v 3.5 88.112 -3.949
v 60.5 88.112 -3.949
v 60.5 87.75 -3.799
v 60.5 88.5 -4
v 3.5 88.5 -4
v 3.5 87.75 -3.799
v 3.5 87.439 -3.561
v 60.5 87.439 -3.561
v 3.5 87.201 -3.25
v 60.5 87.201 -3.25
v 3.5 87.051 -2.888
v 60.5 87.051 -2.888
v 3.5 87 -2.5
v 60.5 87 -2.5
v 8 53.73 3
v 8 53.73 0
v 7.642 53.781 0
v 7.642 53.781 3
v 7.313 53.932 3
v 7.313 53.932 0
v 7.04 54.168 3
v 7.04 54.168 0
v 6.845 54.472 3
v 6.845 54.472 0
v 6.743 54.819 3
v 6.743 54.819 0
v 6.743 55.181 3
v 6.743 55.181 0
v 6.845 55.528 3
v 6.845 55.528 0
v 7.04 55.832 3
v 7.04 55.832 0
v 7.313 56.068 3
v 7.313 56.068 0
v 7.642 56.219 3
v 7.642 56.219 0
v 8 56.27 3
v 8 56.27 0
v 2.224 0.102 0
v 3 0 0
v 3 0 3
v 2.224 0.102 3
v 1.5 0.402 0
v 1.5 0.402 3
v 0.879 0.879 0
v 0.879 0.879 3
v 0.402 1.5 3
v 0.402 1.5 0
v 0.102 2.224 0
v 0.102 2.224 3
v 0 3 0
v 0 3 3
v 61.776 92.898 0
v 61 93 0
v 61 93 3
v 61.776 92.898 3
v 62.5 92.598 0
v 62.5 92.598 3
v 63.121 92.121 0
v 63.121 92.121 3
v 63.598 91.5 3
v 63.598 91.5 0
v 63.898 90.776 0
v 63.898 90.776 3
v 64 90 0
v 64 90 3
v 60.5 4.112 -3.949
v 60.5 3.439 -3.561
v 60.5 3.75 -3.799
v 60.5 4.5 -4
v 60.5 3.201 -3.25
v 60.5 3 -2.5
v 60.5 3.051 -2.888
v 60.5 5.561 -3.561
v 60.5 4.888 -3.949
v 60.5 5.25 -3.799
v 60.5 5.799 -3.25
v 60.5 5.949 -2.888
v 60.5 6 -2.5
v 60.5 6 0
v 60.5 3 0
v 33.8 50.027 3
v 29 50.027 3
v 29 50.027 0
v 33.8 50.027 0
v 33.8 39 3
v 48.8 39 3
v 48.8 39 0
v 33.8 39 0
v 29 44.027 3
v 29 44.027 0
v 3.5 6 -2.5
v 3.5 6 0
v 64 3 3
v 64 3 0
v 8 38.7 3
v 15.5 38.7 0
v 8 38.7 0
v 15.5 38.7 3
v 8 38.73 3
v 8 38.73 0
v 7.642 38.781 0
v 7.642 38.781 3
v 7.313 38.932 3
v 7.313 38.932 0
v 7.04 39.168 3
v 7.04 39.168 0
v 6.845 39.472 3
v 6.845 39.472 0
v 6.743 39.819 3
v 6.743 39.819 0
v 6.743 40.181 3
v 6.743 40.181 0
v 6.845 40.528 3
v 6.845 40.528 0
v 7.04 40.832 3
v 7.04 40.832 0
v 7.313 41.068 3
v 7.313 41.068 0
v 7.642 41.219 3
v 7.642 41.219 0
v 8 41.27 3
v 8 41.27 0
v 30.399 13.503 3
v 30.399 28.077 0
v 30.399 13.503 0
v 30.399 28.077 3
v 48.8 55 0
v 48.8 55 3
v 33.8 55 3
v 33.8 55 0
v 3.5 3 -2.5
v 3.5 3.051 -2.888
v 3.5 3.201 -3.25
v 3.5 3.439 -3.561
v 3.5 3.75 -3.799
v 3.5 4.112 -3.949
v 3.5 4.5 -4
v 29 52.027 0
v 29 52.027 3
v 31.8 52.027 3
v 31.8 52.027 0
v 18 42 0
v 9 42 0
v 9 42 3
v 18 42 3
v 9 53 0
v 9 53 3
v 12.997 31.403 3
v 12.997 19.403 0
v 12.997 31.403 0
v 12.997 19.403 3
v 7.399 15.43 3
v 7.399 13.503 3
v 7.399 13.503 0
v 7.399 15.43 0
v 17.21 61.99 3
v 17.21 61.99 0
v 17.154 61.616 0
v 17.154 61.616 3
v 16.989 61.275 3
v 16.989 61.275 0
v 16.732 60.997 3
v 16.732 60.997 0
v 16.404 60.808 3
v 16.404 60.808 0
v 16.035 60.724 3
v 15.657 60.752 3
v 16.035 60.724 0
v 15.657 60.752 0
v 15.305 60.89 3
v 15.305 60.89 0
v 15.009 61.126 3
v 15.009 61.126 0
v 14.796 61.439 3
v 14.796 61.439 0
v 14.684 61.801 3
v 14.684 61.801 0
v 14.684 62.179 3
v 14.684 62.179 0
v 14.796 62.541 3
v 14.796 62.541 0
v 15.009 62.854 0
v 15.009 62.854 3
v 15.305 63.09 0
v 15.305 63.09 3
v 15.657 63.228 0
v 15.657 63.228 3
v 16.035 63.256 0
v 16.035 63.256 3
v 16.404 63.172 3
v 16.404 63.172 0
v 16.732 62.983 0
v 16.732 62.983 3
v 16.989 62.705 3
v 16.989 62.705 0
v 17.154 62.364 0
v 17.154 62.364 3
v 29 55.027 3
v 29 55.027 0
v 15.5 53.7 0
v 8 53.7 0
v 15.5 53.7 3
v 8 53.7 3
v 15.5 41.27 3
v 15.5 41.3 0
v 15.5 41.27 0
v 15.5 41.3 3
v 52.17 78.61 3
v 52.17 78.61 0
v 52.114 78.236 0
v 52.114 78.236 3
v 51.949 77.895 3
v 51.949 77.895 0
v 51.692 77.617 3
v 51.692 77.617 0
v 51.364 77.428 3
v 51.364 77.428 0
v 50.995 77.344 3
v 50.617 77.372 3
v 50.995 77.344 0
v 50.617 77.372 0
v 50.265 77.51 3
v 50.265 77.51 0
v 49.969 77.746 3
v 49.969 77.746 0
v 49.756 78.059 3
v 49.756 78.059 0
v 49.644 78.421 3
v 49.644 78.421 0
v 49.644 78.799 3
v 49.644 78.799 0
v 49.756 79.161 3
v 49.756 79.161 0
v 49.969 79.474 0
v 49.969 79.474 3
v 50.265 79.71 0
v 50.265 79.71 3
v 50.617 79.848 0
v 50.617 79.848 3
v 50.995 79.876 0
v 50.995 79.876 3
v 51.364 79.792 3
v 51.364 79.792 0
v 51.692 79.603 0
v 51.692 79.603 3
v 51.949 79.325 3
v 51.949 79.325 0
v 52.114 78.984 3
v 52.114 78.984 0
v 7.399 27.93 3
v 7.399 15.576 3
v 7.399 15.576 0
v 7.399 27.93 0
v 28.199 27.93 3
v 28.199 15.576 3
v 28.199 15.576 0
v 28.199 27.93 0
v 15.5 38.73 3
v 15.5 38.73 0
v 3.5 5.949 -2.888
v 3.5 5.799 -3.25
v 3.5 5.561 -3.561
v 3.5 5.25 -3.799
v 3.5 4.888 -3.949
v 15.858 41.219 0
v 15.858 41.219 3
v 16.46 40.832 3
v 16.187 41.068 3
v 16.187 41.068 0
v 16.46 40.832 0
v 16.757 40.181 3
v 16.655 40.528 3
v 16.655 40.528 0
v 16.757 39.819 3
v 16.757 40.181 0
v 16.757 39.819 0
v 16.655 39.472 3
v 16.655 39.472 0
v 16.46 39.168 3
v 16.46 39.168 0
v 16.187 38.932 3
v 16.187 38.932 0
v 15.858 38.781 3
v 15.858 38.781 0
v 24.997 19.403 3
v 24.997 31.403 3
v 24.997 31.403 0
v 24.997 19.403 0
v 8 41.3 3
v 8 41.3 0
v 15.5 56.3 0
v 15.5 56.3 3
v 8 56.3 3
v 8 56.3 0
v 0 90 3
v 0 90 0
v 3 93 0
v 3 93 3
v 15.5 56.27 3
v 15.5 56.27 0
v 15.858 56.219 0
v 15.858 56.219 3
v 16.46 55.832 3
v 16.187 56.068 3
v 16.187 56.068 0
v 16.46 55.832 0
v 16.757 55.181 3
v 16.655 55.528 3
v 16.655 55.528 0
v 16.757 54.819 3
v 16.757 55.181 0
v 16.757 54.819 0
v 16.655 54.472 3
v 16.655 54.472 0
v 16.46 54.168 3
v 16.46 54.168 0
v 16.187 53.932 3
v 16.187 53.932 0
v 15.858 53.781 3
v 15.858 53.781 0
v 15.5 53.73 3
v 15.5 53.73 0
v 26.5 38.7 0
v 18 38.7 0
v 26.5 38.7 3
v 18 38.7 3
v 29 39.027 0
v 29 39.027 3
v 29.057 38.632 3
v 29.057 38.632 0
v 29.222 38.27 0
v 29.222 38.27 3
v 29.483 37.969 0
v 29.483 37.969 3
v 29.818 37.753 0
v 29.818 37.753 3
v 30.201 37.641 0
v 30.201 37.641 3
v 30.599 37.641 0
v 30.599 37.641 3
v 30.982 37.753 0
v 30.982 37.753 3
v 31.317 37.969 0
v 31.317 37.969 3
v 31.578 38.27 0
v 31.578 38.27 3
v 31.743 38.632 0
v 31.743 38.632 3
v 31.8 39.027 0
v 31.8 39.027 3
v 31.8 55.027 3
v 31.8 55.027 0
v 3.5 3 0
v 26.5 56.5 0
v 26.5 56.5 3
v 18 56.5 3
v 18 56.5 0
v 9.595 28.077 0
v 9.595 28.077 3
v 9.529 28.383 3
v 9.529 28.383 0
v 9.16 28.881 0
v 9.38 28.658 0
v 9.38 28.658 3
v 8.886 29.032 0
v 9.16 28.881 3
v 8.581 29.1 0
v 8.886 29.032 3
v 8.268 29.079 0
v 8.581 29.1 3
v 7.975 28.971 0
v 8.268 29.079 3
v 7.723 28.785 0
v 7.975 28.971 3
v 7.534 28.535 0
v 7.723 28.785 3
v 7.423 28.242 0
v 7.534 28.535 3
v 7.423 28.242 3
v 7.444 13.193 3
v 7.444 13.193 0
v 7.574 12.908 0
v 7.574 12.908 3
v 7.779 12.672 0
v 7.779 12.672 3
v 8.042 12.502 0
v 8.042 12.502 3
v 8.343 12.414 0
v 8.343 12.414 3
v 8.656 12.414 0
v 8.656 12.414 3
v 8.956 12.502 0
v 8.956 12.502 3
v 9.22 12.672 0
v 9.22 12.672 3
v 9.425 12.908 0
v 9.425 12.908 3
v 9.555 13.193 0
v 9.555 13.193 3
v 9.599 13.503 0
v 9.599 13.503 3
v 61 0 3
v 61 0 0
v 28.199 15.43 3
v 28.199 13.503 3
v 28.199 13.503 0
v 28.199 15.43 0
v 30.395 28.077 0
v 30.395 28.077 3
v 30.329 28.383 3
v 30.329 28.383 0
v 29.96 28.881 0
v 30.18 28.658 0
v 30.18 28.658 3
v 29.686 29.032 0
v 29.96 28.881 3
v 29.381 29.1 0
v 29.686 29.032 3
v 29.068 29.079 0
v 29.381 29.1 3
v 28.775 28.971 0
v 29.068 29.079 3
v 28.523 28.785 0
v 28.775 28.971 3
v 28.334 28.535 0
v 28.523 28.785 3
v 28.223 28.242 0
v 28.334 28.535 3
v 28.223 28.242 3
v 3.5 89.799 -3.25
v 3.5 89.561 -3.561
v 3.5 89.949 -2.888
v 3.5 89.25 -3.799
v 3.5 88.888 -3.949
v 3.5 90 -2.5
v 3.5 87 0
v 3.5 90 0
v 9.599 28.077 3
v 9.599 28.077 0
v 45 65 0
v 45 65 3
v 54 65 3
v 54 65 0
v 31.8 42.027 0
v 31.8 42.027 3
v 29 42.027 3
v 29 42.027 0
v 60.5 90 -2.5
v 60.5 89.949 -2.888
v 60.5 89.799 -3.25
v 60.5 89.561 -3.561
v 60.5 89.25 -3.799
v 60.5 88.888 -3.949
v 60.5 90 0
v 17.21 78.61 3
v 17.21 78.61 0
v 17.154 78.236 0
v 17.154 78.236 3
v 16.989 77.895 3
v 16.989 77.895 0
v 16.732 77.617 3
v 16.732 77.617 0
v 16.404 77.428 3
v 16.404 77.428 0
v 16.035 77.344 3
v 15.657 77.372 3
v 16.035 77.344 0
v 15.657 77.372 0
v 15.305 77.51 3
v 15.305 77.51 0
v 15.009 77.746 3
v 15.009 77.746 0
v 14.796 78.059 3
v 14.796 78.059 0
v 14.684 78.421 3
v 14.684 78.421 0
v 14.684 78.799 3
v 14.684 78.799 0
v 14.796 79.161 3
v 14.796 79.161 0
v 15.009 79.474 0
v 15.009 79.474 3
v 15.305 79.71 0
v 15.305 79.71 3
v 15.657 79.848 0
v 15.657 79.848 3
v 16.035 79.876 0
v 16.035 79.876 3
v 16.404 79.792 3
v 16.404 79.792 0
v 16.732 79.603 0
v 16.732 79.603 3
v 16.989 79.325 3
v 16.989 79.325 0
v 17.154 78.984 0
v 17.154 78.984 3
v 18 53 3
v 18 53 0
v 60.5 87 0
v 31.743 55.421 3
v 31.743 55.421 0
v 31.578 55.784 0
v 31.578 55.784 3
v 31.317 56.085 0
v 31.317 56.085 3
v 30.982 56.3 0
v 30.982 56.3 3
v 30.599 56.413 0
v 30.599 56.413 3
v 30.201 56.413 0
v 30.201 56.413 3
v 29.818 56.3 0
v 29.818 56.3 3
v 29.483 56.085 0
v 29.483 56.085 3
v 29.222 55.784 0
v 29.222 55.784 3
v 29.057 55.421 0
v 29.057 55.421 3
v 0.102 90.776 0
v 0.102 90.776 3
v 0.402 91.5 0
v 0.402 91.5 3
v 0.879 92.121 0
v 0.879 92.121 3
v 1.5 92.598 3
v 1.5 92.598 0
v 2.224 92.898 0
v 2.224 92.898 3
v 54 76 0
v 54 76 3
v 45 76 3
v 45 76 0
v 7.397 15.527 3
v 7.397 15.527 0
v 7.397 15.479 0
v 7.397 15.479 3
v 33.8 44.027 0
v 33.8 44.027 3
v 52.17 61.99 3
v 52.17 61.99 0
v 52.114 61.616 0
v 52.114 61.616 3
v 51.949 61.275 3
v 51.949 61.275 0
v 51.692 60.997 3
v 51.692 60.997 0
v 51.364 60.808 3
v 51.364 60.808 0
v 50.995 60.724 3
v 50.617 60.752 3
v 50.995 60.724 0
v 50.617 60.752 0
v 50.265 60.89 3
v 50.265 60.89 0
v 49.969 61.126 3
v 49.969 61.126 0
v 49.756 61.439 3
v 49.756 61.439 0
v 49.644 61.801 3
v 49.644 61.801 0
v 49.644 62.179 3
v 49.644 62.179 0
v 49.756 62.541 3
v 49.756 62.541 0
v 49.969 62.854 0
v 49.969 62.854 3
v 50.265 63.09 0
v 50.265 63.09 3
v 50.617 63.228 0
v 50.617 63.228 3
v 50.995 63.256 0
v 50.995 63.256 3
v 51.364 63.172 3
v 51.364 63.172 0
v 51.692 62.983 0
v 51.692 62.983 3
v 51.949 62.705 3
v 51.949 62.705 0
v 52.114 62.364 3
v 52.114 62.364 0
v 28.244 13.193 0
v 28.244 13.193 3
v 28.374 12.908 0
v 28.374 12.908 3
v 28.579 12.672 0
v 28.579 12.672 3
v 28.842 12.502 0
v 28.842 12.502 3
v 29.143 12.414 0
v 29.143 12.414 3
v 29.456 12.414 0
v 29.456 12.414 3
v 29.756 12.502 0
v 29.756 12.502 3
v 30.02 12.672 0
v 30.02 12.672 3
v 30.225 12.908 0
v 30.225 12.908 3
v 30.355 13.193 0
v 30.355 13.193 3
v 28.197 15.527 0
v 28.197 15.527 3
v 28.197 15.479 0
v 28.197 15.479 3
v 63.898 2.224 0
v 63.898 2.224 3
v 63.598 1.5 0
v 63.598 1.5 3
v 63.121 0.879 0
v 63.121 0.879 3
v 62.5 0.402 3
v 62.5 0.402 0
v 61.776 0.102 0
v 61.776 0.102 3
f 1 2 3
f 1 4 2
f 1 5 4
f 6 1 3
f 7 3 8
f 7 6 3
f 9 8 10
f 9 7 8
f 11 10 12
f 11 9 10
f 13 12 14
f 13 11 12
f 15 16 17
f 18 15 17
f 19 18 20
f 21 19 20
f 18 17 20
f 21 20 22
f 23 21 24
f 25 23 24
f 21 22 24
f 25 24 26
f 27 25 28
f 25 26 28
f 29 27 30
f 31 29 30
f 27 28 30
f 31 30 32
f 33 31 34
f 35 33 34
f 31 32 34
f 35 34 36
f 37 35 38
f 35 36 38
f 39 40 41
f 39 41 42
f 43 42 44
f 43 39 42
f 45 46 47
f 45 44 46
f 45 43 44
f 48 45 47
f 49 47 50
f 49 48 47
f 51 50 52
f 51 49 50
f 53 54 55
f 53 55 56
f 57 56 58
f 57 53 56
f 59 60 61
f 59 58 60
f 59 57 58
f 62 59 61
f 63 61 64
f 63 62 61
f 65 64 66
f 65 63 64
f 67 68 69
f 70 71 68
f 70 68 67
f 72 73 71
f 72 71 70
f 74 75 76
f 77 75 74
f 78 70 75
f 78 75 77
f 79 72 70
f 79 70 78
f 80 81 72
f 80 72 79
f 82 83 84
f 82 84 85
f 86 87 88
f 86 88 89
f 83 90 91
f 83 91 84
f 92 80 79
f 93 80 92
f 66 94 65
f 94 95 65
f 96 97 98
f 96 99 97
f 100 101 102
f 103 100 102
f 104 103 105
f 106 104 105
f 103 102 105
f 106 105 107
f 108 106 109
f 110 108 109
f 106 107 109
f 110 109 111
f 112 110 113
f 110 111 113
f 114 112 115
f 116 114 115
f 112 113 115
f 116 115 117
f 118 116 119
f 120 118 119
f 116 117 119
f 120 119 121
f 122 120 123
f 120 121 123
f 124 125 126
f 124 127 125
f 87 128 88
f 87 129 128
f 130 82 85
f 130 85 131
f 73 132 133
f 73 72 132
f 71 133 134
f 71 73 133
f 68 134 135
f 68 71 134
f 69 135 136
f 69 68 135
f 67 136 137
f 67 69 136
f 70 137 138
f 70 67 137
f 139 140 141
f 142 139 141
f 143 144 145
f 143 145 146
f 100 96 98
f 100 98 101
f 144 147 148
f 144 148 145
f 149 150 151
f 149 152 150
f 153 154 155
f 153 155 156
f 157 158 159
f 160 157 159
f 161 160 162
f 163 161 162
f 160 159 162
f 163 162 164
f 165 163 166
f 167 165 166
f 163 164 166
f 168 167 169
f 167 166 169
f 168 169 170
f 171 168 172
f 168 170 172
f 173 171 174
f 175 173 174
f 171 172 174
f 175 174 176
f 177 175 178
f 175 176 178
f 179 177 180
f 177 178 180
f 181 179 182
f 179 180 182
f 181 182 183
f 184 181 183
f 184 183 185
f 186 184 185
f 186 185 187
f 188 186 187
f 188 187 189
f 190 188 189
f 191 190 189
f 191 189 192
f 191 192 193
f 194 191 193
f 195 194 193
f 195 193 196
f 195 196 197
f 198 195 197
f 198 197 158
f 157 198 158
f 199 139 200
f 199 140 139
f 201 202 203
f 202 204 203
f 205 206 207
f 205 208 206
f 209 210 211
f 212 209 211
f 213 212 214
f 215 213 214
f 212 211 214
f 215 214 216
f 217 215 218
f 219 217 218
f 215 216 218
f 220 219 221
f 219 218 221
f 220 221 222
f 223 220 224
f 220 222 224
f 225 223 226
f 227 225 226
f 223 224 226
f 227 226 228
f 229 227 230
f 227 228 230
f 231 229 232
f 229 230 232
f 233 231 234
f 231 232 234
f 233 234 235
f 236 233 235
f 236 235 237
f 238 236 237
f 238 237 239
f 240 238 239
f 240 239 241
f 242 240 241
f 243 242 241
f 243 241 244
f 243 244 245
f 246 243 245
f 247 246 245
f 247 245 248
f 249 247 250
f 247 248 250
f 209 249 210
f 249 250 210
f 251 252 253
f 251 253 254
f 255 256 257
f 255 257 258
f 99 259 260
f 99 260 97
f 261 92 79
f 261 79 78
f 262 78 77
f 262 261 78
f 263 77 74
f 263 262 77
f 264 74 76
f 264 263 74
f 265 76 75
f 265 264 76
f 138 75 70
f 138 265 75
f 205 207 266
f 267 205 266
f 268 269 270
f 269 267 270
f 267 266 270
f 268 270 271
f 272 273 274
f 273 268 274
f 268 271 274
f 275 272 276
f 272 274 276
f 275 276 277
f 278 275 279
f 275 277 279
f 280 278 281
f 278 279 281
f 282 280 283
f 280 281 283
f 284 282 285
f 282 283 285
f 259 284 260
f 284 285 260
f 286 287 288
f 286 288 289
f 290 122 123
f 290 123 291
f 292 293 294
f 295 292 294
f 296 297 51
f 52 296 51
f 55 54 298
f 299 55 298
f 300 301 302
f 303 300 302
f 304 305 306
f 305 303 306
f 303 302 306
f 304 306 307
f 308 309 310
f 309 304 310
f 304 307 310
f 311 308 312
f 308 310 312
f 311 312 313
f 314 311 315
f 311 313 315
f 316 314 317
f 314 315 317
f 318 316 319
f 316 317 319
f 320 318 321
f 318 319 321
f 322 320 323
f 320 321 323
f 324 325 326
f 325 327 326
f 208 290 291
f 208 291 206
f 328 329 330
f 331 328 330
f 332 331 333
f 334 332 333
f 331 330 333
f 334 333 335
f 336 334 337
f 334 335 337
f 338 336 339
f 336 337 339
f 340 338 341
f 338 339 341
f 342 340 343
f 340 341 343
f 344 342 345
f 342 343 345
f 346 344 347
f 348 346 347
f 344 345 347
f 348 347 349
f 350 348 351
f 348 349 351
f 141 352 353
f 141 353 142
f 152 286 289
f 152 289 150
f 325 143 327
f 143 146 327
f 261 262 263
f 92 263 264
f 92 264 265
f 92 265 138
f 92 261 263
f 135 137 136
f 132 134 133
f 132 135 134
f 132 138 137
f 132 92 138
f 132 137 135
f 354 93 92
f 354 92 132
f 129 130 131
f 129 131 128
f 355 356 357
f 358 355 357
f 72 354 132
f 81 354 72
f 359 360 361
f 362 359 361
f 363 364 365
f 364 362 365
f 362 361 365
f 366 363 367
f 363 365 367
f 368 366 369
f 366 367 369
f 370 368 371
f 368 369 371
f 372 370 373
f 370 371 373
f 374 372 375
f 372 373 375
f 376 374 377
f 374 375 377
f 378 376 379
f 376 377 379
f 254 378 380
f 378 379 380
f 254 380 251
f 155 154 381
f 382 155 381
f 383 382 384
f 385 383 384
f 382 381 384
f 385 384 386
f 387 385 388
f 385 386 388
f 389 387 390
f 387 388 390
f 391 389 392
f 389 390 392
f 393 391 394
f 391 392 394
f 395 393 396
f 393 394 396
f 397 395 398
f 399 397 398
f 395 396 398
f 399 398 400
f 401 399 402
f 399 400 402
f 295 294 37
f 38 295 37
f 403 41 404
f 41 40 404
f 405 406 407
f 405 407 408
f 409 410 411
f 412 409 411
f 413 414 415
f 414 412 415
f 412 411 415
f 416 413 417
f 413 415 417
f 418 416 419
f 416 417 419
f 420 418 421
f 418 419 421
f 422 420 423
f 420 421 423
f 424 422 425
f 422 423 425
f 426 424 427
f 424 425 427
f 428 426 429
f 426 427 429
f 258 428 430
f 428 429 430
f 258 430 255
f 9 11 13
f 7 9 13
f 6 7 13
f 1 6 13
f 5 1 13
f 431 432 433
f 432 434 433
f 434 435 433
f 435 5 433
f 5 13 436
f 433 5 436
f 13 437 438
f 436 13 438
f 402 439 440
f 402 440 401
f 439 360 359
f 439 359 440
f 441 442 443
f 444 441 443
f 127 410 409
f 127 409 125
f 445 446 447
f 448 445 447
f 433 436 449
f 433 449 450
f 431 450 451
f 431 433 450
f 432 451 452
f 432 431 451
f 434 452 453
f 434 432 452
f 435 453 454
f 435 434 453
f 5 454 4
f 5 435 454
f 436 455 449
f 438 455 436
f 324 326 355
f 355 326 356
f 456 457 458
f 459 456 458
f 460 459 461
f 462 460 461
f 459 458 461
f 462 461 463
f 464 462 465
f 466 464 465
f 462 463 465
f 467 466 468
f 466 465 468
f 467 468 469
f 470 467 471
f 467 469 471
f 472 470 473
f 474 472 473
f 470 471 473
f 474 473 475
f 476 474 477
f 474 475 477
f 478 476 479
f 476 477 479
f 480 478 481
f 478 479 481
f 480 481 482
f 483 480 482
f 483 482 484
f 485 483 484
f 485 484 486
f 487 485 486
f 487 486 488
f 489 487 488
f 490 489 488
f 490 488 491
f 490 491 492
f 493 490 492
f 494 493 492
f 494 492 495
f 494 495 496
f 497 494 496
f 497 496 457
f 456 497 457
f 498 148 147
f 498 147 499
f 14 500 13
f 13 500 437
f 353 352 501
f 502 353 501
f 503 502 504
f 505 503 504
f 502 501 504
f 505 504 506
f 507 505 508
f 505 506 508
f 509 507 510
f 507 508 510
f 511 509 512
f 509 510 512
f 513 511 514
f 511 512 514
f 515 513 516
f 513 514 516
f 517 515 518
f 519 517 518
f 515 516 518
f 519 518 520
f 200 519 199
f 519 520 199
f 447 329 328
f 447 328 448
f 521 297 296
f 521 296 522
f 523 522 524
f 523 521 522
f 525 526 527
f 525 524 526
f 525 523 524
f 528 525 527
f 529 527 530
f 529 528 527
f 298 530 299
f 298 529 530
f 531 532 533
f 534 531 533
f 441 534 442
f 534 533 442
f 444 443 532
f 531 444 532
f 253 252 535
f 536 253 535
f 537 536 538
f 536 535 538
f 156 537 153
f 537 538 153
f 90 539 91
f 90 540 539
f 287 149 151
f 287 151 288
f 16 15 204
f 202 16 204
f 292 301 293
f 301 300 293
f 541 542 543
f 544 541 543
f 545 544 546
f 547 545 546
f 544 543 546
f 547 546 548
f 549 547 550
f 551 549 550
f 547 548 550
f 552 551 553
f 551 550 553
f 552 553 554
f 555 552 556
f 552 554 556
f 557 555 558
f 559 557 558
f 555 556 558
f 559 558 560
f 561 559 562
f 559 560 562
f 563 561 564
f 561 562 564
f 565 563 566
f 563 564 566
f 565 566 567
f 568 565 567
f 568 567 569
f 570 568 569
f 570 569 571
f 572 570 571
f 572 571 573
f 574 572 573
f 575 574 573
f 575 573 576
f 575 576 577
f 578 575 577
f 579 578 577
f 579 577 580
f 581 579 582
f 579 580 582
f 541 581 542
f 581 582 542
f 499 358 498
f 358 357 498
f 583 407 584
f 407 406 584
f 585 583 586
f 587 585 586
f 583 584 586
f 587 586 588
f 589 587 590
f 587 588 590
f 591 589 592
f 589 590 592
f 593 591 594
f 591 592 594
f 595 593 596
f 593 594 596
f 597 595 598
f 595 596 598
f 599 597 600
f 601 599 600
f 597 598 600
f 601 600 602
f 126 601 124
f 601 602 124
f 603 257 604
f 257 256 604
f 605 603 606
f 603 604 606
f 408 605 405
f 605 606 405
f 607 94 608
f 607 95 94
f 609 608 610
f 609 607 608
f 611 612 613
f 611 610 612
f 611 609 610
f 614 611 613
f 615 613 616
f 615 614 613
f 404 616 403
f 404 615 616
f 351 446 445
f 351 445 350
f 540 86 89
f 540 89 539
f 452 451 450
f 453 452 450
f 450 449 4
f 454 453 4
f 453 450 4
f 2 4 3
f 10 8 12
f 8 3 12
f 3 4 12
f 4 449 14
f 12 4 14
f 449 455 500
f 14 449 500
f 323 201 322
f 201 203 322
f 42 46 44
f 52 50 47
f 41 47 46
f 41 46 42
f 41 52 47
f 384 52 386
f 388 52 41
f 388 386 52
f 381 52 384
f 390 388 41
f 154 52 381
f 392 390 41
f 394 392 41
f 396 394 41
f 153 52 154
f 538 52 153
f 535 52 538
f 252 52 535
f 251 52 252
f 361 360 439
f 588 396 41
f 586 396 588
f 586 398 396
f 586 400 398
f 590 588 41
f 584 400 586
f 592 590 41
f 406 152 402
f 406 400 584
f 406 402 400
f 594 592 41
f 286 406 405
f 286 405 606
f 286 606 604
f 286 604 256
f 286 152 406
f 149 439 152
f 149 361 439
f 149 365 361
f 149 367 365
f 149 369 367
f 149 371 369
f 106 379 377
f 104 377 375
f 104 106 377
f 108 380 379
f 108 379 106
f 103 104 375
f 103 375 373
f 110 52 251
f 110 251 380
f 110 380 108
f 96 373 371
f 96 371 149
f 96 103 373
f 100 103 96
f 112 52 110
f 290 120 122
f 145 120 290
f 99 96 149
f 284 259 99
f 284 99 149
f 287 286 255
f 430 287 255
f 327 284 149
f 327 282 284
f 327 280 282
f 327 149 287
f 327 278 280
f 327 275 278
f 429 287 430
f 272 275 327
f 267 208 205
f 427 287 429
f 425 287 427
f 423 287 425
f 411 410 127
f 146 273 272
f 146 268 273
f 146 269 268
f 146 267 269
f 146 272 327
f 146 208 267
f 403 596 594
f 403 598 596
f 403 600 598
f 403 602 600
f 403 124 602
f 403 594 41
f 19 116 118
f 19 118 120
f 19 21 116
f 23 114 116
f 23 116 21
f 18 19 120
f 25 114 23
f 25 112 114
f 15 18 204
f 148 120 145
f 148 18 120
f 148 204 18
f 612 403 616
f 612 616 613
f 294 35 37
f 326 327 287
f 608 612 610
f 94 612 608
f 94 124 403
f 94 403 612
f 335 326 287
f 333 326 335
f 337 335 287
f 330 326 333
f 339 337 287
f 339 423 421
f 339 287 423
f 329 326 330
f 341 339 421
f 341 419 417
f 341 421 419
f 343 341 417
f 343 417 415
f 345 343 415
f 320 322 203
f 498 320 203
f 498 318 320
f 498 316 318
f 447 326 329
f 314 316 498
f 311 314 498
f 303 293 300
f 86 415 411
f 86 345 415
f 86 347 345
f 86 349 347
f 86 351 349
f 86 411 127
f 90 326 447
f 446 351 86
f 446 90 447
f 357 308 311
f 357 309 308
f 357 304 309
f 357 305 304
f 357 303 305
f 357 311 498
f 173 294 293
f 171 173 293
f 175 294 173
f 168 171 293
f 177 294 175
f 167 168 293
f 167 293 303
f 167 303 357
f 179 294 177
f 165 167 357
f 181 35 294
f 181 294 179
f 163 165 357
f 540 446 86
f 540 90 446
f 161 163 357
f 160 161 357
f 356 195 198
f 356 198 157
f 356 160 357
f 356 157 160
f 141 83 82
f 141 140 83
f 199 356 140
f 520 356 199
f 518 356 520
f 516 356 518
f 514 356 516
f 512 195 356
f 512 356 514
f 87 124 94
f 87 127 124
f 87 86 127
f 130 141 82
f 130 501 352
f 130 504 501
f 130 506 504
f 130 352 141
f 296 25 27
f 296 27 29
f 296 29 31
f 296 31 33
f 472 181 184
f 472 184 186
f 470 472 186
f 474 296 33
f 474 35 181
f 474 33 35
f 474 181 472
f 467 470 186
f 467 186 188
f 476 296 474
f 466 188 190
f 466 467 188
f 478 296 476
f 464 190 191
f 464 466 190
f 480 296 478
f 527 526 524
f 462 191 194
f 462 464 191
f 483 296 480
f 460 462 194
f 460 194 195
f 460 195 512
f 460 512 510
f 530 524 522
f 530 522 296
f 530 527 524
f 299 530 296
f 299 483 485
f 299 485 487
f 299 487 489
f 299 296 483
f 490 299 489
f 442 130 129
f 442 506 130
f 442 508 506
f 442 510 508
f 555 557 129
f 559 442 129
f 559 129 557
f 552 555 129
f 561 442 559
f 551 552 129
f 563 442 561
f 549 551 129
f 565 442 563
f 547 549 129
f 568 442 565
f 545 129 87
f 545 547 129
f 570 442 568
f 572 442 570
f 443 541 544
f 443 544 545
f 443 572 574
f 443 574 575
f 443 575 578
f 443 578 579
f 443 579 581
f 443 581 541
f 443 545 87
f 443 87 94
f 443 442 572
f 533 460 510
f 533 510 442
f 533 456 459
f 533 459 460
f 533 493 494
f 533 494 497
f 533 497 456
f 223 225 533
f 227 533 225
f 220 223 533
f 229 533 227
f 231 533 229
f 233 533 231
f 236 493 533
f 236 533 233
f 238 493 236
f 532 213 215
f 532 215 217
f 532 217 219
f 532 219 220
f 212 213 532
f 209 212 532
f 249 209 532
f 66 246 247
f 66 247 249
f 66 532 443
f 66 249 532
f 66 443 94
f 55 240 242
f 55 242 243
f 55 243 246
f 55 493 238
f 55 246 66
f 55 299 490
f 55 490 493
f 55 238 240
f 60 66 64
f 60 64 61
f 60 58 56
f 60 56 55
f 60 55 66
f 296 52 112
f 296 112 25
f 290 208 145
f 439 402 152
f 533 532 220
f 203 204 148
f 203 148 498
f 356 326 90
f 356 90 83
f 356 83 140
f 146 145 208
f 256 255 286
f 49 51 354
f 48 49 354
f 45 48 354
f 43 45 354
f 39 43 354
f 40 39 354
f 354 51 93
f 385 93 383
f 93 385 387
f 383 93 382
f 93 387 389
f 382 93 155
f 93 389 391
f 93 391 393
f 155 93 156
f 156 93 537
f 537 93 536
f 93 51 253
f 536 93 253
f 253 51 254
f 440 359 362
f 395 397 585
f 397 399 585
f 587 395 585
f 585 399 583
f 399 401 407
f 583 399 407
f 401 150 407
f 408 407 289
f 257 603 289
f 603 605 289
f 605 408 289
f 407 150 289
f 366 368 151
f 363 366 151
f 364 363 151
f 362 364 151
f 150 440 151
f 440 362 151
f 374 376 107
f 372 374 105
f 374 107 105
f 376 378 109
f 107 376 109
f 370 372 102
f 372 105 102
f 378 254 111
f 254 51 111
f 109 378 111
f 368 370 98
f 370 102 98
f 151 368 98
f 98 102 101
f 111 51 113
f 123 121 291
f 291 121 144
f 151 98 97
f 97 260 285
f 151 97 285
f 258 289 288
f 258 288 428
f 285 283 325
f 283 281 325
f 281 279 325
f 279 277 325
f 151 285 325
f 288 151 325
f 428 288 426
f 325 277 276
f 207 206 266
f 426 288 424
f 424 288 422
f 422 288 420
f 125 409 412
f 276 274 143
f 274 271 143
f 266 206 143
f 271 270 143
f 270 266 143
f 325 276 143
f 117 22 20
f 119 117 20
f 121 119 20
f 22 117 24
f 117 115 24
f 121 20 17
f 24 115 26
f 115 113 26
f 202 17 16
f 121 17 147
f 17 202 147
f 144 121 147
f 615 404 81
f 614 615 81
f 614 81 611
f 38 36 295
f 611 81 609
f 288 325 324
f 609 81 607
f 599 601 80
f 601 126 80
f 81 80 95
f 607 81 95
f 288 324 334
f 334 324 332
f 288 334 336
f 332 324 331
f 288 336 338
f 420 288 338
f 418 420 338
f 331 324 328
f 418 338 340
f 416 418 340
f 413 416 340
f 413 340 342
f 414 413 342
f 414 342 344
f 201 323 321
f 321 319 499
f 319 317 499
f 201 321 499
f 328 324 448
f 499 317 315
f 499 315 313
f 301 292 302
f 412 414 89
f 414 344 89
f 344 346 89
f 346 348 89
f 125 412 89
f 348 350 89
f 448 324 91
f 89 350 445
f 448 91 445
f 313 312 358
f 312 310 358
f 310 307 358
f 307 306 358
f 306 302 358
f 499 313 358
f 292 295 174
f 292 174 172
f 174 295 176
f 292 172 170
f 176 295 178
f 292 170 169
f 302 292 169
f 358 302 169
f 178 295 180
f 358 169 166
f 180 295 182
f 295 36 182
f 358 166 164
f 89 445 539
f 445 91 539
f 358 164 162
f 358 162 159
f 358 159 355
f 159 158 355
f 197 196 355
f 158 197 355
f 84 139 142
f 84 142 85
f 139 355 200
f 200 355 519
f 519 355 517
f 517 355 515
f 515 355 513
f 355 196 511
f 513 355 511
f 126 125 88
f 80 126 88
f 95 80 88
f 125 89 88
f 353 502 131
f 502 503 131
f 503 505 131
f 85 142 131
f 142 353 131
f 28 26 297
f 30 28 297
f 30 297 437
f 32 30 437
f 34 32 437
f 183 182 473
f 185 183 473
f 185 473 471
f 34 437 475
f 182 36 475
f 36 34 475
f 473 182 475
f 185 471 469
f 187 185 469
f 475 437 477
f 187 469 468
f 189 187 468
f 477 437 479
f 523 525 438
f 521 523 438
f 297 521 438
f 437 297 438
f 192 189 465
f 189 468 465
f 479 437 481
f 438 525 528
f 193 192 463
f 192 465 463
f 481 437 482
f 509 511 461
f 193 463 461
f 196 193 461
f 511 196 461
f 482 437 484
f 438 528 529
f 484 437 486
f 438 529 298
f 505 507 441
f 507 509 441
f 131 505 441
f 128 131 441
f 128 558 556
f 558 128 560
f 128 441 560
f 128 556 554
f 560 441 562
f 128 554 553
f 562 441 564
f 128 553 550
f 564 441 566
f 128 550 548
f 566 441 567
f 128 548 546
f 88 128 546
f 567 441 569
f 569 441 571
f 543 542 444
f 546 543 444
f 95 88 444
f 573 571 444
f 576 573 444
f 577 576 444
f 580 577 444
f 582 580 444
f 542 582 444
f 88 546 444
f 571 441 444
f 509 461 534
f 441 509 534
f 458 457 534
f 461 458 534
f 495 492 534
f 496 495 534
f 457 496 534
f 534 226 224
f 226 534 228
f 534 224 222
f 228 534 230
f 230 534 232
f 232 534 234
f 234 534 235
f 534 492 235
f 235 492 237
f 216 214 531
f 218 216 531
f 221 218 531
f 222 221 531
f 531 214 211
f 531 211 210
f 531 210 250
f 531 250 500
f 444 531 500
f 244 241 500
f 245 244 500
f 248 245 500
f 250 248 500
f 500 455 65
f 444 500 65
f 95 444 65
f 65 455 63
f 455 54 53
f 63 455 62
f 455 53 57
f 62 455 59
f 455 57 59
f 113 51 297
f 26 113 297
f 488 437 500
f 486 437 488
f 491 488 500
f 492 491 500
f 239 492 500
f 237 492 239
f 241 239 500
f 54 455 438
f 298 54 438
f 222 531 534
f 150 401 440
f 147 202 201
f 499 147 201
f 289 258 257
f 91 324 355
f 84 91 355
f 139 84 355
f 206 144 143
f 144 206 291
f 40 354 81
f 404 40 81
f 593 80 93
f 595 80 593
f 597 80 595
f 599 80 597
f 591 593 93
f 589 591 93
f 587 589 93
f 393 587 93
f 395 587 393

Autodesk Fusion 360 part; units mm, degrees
sketch "Sketch5" plane through (0, 0, 0) normal (0, 0, 1) x (1, 0, 0)
  line L0 (3, 0) -> (61, 0)
  line L1 (64, 3) -> (64, 90)
  line L2 (61, 93) -> (3, 93)
  line L3 (0, 90) -> (0, 3)
  arc A0 (0, 3) -> (3, 0) centre (3, 3) ccw
  arc A1 (3, 93) -> (0, 90) centre (3, 90) ccw
  arc A2 (64, 90) -> (61, 93) centre (61, 90) ccw
  arc A3 (61, 0) -> (64, 3) centre (61, 3) ccw
  point P0 (64, 0)
  point P1 (0, 93)
  dimension "d27" = 64
  dimension "d28" = 93
  dimension "d29" = 3
extrude "Extrude5" add sketch "Sketch5" along normal blind 3
sketch "Sketch6" plane through (0, 0, 0) normal (0, 0, -1) x (1, 0, 0)
  arc A0 (64, -3) -> (61, 0) centre (61, -3) ccw
  line L0 (61, 0) -> (3, 0)
  arc A1 (3, 0) -> (0, -3) centre (3, -3) ccw
  line L1 (0, -3) -> (0, -90)
  arc A2 (0, -90) -> (3, -93) centre (3, -90) ccw
  line L2 (3, -93) -> (61, -93)
  arc A3 (61, -93) -> (64, -90) centre (61, -90) ccw
  line L3 (64, -90) -> (64, -3)
  line L4 (3, -3) -> (61, -3)
  line L5 (61, -3) -> (61, -90)
  line L6 (61, -90) -> (3, -90)
  line L7 (3, -90) -> (3, -3)
  line L8 (3.5, -3) -> (60.5, -3)
  line L9 (60.5, -3) -> (60.5, -6)
  line L10 (60.5, -6) -> (3.5, -6)
  line L11 (3.5, -6) -> (3.5, -3)
  line L12 (3.5, -90) -> (60.5, -90)
  line L13 (60.5, -90) -> (60.5, -87)
  line L14 (60.5, -87) -> (3.5, -87)
  line L15 (3.5, -87) -> (3.5, -90)
  dimension "d32" = 58
  dimension "d33" = 87
  dimension "d34" = 3
  dimension "d35" = 3
  dimension "d36" = 57
  dimension "d37" = 3
  dimension "d38" = 0.5
  dimension "d39" = 57
  dimension "d40" = 3
  dimension "d151" = 0.5
extrude "Extrude6" add sketch "Sketch6" along normal blind 4 contours L4 L8 L9 L10 L11 | L6 L12 L13 L14 L15
sketch "Sketch8" plane through (0, 0, 0) normal (0, 0, -1) x (1, 0, 0)
  line L0 (3.5, -6) -> (3.5, -3)
  line L1 (3.5, -3) -> (60.5, -3)
  line L2 (60.5, -3) -> (60.5, -6)
  line L3 (60.5, -6) -> (3.5, -6)
  line L4 (3.5, -87) -> (60.5, -87)
  line L5 (60.5, -87) -> (60.5, -90)
  line L6 (60.5, -90) -> (3.5, -90)
  line L7 (3.5, -90) -> (3.5, -87)
  arc A0 (64, -3) -> (61, 0) centre (61, -3) ccw
  line L8 (61, 0) -> (3, 0)
  arc A1 (3, 0) -> (0, -3) centre (3, -3) ccw
  line L9 (0, -3) -> (0, -90)
  arc A2 (0, -90) -> (3, -93) centre (3, -90) ccw
  line L10 (3, -93) -> (61, -93)
  arc A3 (61, -93) -> (64, -90) centre (61, -90) ccw
  line L11 (64, -90) -> (64, -3)
  circle A4 centre (15.94, -61.99) radius 1.27
  circle A5 centre (15.94, -78.61) radius 1.27
  circle A6 centre (50.9, -78.61) radius 1.27
  circle A7 centre (50.9, -61.99) radius 1.27
  line L12 (64, -81) -> (0, -81)
  line L13 (0, -81) -> (0, -59.6)
  line L14 (0, -59.6) -> (64, -59.6)
  line L15 (64, -59.6) -> (64, -81)
  dimension "d52" = 2.54
  dimension "d55" = 2.54
  dimension "d58" = 2.54
  dimension "d61" = 2.54
  dimension "d85" = 64
  dimension "d86" = 21.4
  dimension "d87" = 6
  dimension "d92" = 2.39
  dimension "d93" = 2.39
  dimension "d96" = 2.39
  dimension "d97" = 15.94
  dimension "d98" = 2.39
  dimension "d99" = 15.94
  dimension "d100" = 50.9
  dimension "d101" = 50.9
extrude "Extrude8" cut sketch "Sketch8" against normal blind 3 contours A4 | A5 | A6 | A7
sketch "Sketch9" plane through (0, 0, 0) normal (0, 0, -1) x (1, 0, 0)
  circle A0 centre (50.9, -61.99) radius 1.27
  circle A1 centre (50.9, -78.61) radius 1.27
  circle A2 centre (15.94, -61.99) radius 1.27
  circle A3 centre (15.94, -78.61) radius 1.27
  line L0 (3.5, -6) -> (3.5, -3)
  line L1 (3.5, -3) -> (60.5, -3)
  line L2 (60.5, -3) -> (60.5, -6)
  line L3 (60.5, -6) -> (3.5, -6)
  line L4 (3.5, -87) -> (60.5, -87)
  line L5 (60.5, -87) -> (60.5, -90)
  line L6 (60.5, -90) -> (3.5, -90)
  line L7 (3.5, -90) -> (3.5, -87)
  arc A4 (64, -3) -> (61, 0) centre (61, -3) ccw
  line L8 (61, 0) -> (3, 0)
  arc A5 (3, 0) -> (0, -3) centre (3, -3) ccw
  line L9 (0, -3) -> (0, -90)
  arc A6 (0, -90) -> (3, -93) centre (3, -90) ccw
  line L10 (3, -93) -> (61, -93)
  arc A7 (61, -93) -> (64, -90) centre (61, -90) ccw
  line L11 (64, -90) -> (64, -3)
  circle A8 centre (8, -40) radius 1.27
  circle A9 centre (8, -55) radius 1.27
  circle A10 centre (15.5, -40) radius 1.27
  circle A11 centre (15.5, -55) radius 1.27
  line L12 (9, -42) -> (14, -42)
  line L13 (14, -42) -> (14, -53)
  line L14 (14, -53) -> (9, -53)
  line L15 (9, -53) -> (9, -42)
  line L16 (14, -53) -> (22.5, -53)
  line L17 (22.5, -53) -> (22.5, -42)
  line L18 (22.5, -42) -> (14, -42)
  line L19 (14, -42) -> (14, -53)
  dimension "d70" = 2.54
  dimension "d73" = 2.54
  dimension "d76" = 2.54
  dimension "d79" = 2.54
extrude "Extrude9" cut sketch "Sketch9" against normal blind 3 contours A8 | A9 | A10 | A11 | L12 L13 L14 L15 L19
fillet "Fillet5" radius 1.5 4 edges at (32, 3, -4) (32, 6, -4) (32, 87, -4) (32, 90, -4)
sketch "Sketch11" plane through (0, 0, 3) normal (0, 0, 1) x (-1, 0, 0)
  circle A0 centre (-50.9, -61.99) radius 1.27
  circle A1 centre (-50.9, -78.61) radius 1.27
  circle A2 centre (-15.94, -61.99) radius 1.27
  circle A3 centre (-15.94, -78.61) radius 1.27
  arc A4 (-61, 0) -> (-64, -3) centre (-61, -3) ccw
  line L0 (-64, -3) -> (-64, -90)
  arc A5 (-64, -90) -> (-61, -93) centre (-61, -90) ccw
  line L1 (-61, -93) -> (-3, -93)
  arc A6 (-3, -93) -> (0, -90) centre (-3, -90) ccw
  line L2 (0, -90) -> (0, -3)
  arc A7 (0, -3) -> (-3, 0) centre (-3, -3) ccw
  line L3 (-3, 0) -> (-61, 0)
  line L4 (-14, -53) -> (-14, -42)
  line L5 (-14, -42) -> (-9, -42)
  line L6 (-9, -42) -> (-9, -53)
  line L7 (-9, -53) -> (-14, -53)
  circle A8 centre (-15.5, -40) radius 1.27
  circle A9 centre (-8, -55) radius 1.27
  circle A10 centre (-8, -40) radius 1.27
  circle A11 centre (-15.5, -55) radius 1.27
sketch "Sketch12" plane through (0, 0, 3) normal (0, 0, 1) x (-1, 0, 0)
  line L0 (-6.497, -13.503) -> (-6.497, -37.303)
  line L1 (-6.497, -37.303) -> (-31.497, -37.303)
  line L2 (-31.497, -37.303) -> (-31.497, -13.503)
  line L3 (-31.497, -13.503) -> (-6.497, -13.503)
  circle A0 centre (-8.497, -15.503) radius 1.1
  circle A1 centre (-29.297, -15.503) radius 1.1
  circle A2 centre (-8.497, -28.003) radius 1.1
  circle A3 centre (-29.297, -28.003) radius 1.1
  line L4 (-12.997, -19.403) -> (-12.997, -31.403)
  line L5 (-12.997, -31.403) -> (-24.997, -31.403)
  line L6 (-24.997, -31.403) -> (-24.997, -19.403)
  line L7 (-24.997, -19.403) -> (-12.997, -19.403)
  line L8 (-8, -41.3) -> (-15.5, -41.3)
  line L9 (-15.5, -41.3) -> (-15.5, -38.7)
  line L10 (-15.5, -38.7) -> (-8, -38.7)
  line L11 (-8, -38.7) -> (-8, -41.3)
  line L12 (-15.5, -56.3) -> (-8, -56.3)
  line L13 (-8, -56.3) -> (-8, -53.7)
  line L14 (-8, -53.7) -> (-15.5, -53.7)
  line L15 (-15.5, -53.7) -> (-15.5, -56.3)
  line L16 (-54, -76) -> (-45, -76)
  line L17 (-45, -76) -> (-45, -65)
  line L18 (-45, -65) -> (-54, -65)
  line L19 (-54, -65) -> (-54, -76)
  line L20 (-7.3994, -28.077) -> (-9.5994, -28.077)
  line L21 (-9.5994, -28.077) -> (-9.5994, -13.503)
  line L22 (-9.5994, -13.503) -> (-7.3994, -13.503)
  line L23 (-7.3994, -13.503) -> (-7.3994, -28.077)
  line L24 (-28.1994, -28.077) -> (-30.3994, -28.077)
  line L25 (-30.3994, -28.077) -> (-30.3994, -13.503)
  line L26 (-30.3994, -13.503) -> (-28.1994, -13.503)
  line L27 (-28.1994, -13.503) -> (-28.1994, -28.077)
  arc A4 (-7.3994, -13.503) -> (-9.5994, -13.503) centre (-8.4994, -13.503) ccw
  arc A5 (-28.1994, -13.503) -> (-30.3994, -13.503) centre (-29.2994, -13.503) ccw
  dimension "d106" = 23.8
  dimension "d107" = 25
  dimension "d108" = 2.2
  dimension "d109" = 2
  dimension "d110" = 2
  dimension "d111" = 2.2
  dimension "d112" = 2
  dimension "d113" = 2.2
  dimension "d114" = 2.2
  dimension "d115" = 2
  dimension "d116" = 14.5
  dimension "d117" = 2.2
  dimension "d118" = 2.2
  dimension "d119" = 14.5
  dimension "d120" = 12
  dimension "d121" = 12
  dimension "d122" = 6.5
  dimension "d123" = 5.9
  dimension "d143" = 2.2
  dimension "d144" = 14.574
  dimension "d145" = 2.2
  dimension "d146" = 14.574
extrude "Extrude10" cut sketch "Sketch12" against normal blind 3 contours L3 A0 A2 L20 L21 L22 L23 | L3 L22 A4 | A0 L23 | A0 L23 | L3 A1 A3 L24 L25 L26 L27 | L3 L26 A5 | A1 L27 | A1 L27 | A2 L20 | A2 L20 L23 | A2 L23 | A3 L24 | A3 L24 L27 | A3 L27 | L4 L5 L6 L7
sketch "Sketch13" plane through (0, 0, 3) normal (0, 0, 1) x (-1, 0, 0)
  line L0 (-29, -55.0268) -> (-31.8, -55.0268)
  line L1 (-31.8, -55.0268) -> (-31.8, -39.0268)
  line L2 (-31.8, -39.0268) -> (-29, -39.0268)
  line L3 (-29, -39.0268) -> (-29, -55.0268)
  arc A0 (-31.8, -55.0268) -> (-29, -55.0268) centre (-30.4, -55.0268) ccw
  arc A1 (-29, -39.0268) -> (-31.8, -39.0268) centre (-30.4, -39.0268) ccw
  line L4 (-33.8, -55) -> (-48.8, -55)
  line L5 (-48.8, -55) -> (-48.8, -39)
  line L6 (-48.8, -39) -> (-33.8, -39)
  line L7 (-33.8, -39) -> (-33.8, -55)
  line L8 (-14, -42) -> (-14, -53)
  line L9 (-29, -50.0268) -> (-31.8, -50.0268)
  line L10 (-31.8, -50.0268) -> (-31.8, -44.0268)
  line L11 (-31.8, -44.0268) -> (-29, -44.0268)
  line L12 (-29, -44.0268) -> (-29, -50.0268)
  line L13 (-29, -52.0268) -> (-31.8, -52.0268)
  line L14 (-31.8, -52.0268) -> (-31.8, -42.0268)
  line L15 (-31.8, -42.0268) -> (-29, -42.0268)
  line L16 (-29, -42.0268) -> (-29, -52.0268)
  line L17 (-31.8, -50.0268) -> (-33.8, -50.0268)
  line L18 (-33.8, -50.0268) -> (-33.8, -44.0268)
  line L19 (-33.8, -44.0268) -> (-31.8, -44.0268)
  line L20 (-31.8, -44.0268) -> (-31.8, -50.0268)
  line L21 (-14, -53) -> (-21.5354, -53)
  line L22 (-21.5354, -53) -> (-21.5354, -42)
  line L23 (-21.5354, -42) -> (-14, -42)
  line L24 (-14, -42) -> (-14, -53)
  dimension "d126" = 2.8
  dimension "d127" = 16
  dimension "d128" = 15
  dimension "d129" = 16
  dimension "d130" = 2
  dimension "d133" = 15
  dimension "d134" = 6
  dimension "d135" = 5
  dimension "d136" = 2.8
  dimension "d137" = 10
  dimension "d138" = 3
extrude "Extrude12" cut sketch "Sketch13" against normal blind 3 contours L0 A0 | L0 L1 L3 L13 | L1 L3 L9 L10 L11 L12 L14 L16 L20 | L1 L7 L10 L14 L17 L18 L19 L20 | L4 L5 L6 L7 L18 | L1 L2 L3 L15 | L2 A1
extrude "Extrude13" cut sketch "Sketch12" against normal blind 3 contours L8 L9 L10 L11 | L12 L13 L14 L15 | L16 L17 L18 L19
extrude "Extrude14" cut sketch "Sketch13" against normal blind 3 contours L8 L21 L22 L23 L24
sketch "Sketch14" plane through (0, 0, 3) normal (0, 0, 1) x (-1, 0, 0)
  line L0 (-18, -38.7) -> (-26.5, -38.7)
  line L1 (-26.5, -38.7) -> (-26.5, -56.5)
  line L2 (-26.5, -56.5) -> (-18, -56.5)
  line L3 (-18, -56.5) -> (-18, -38.7)
extrude "Extrude15" cut sketch "Sketch14" against normal blind 3
